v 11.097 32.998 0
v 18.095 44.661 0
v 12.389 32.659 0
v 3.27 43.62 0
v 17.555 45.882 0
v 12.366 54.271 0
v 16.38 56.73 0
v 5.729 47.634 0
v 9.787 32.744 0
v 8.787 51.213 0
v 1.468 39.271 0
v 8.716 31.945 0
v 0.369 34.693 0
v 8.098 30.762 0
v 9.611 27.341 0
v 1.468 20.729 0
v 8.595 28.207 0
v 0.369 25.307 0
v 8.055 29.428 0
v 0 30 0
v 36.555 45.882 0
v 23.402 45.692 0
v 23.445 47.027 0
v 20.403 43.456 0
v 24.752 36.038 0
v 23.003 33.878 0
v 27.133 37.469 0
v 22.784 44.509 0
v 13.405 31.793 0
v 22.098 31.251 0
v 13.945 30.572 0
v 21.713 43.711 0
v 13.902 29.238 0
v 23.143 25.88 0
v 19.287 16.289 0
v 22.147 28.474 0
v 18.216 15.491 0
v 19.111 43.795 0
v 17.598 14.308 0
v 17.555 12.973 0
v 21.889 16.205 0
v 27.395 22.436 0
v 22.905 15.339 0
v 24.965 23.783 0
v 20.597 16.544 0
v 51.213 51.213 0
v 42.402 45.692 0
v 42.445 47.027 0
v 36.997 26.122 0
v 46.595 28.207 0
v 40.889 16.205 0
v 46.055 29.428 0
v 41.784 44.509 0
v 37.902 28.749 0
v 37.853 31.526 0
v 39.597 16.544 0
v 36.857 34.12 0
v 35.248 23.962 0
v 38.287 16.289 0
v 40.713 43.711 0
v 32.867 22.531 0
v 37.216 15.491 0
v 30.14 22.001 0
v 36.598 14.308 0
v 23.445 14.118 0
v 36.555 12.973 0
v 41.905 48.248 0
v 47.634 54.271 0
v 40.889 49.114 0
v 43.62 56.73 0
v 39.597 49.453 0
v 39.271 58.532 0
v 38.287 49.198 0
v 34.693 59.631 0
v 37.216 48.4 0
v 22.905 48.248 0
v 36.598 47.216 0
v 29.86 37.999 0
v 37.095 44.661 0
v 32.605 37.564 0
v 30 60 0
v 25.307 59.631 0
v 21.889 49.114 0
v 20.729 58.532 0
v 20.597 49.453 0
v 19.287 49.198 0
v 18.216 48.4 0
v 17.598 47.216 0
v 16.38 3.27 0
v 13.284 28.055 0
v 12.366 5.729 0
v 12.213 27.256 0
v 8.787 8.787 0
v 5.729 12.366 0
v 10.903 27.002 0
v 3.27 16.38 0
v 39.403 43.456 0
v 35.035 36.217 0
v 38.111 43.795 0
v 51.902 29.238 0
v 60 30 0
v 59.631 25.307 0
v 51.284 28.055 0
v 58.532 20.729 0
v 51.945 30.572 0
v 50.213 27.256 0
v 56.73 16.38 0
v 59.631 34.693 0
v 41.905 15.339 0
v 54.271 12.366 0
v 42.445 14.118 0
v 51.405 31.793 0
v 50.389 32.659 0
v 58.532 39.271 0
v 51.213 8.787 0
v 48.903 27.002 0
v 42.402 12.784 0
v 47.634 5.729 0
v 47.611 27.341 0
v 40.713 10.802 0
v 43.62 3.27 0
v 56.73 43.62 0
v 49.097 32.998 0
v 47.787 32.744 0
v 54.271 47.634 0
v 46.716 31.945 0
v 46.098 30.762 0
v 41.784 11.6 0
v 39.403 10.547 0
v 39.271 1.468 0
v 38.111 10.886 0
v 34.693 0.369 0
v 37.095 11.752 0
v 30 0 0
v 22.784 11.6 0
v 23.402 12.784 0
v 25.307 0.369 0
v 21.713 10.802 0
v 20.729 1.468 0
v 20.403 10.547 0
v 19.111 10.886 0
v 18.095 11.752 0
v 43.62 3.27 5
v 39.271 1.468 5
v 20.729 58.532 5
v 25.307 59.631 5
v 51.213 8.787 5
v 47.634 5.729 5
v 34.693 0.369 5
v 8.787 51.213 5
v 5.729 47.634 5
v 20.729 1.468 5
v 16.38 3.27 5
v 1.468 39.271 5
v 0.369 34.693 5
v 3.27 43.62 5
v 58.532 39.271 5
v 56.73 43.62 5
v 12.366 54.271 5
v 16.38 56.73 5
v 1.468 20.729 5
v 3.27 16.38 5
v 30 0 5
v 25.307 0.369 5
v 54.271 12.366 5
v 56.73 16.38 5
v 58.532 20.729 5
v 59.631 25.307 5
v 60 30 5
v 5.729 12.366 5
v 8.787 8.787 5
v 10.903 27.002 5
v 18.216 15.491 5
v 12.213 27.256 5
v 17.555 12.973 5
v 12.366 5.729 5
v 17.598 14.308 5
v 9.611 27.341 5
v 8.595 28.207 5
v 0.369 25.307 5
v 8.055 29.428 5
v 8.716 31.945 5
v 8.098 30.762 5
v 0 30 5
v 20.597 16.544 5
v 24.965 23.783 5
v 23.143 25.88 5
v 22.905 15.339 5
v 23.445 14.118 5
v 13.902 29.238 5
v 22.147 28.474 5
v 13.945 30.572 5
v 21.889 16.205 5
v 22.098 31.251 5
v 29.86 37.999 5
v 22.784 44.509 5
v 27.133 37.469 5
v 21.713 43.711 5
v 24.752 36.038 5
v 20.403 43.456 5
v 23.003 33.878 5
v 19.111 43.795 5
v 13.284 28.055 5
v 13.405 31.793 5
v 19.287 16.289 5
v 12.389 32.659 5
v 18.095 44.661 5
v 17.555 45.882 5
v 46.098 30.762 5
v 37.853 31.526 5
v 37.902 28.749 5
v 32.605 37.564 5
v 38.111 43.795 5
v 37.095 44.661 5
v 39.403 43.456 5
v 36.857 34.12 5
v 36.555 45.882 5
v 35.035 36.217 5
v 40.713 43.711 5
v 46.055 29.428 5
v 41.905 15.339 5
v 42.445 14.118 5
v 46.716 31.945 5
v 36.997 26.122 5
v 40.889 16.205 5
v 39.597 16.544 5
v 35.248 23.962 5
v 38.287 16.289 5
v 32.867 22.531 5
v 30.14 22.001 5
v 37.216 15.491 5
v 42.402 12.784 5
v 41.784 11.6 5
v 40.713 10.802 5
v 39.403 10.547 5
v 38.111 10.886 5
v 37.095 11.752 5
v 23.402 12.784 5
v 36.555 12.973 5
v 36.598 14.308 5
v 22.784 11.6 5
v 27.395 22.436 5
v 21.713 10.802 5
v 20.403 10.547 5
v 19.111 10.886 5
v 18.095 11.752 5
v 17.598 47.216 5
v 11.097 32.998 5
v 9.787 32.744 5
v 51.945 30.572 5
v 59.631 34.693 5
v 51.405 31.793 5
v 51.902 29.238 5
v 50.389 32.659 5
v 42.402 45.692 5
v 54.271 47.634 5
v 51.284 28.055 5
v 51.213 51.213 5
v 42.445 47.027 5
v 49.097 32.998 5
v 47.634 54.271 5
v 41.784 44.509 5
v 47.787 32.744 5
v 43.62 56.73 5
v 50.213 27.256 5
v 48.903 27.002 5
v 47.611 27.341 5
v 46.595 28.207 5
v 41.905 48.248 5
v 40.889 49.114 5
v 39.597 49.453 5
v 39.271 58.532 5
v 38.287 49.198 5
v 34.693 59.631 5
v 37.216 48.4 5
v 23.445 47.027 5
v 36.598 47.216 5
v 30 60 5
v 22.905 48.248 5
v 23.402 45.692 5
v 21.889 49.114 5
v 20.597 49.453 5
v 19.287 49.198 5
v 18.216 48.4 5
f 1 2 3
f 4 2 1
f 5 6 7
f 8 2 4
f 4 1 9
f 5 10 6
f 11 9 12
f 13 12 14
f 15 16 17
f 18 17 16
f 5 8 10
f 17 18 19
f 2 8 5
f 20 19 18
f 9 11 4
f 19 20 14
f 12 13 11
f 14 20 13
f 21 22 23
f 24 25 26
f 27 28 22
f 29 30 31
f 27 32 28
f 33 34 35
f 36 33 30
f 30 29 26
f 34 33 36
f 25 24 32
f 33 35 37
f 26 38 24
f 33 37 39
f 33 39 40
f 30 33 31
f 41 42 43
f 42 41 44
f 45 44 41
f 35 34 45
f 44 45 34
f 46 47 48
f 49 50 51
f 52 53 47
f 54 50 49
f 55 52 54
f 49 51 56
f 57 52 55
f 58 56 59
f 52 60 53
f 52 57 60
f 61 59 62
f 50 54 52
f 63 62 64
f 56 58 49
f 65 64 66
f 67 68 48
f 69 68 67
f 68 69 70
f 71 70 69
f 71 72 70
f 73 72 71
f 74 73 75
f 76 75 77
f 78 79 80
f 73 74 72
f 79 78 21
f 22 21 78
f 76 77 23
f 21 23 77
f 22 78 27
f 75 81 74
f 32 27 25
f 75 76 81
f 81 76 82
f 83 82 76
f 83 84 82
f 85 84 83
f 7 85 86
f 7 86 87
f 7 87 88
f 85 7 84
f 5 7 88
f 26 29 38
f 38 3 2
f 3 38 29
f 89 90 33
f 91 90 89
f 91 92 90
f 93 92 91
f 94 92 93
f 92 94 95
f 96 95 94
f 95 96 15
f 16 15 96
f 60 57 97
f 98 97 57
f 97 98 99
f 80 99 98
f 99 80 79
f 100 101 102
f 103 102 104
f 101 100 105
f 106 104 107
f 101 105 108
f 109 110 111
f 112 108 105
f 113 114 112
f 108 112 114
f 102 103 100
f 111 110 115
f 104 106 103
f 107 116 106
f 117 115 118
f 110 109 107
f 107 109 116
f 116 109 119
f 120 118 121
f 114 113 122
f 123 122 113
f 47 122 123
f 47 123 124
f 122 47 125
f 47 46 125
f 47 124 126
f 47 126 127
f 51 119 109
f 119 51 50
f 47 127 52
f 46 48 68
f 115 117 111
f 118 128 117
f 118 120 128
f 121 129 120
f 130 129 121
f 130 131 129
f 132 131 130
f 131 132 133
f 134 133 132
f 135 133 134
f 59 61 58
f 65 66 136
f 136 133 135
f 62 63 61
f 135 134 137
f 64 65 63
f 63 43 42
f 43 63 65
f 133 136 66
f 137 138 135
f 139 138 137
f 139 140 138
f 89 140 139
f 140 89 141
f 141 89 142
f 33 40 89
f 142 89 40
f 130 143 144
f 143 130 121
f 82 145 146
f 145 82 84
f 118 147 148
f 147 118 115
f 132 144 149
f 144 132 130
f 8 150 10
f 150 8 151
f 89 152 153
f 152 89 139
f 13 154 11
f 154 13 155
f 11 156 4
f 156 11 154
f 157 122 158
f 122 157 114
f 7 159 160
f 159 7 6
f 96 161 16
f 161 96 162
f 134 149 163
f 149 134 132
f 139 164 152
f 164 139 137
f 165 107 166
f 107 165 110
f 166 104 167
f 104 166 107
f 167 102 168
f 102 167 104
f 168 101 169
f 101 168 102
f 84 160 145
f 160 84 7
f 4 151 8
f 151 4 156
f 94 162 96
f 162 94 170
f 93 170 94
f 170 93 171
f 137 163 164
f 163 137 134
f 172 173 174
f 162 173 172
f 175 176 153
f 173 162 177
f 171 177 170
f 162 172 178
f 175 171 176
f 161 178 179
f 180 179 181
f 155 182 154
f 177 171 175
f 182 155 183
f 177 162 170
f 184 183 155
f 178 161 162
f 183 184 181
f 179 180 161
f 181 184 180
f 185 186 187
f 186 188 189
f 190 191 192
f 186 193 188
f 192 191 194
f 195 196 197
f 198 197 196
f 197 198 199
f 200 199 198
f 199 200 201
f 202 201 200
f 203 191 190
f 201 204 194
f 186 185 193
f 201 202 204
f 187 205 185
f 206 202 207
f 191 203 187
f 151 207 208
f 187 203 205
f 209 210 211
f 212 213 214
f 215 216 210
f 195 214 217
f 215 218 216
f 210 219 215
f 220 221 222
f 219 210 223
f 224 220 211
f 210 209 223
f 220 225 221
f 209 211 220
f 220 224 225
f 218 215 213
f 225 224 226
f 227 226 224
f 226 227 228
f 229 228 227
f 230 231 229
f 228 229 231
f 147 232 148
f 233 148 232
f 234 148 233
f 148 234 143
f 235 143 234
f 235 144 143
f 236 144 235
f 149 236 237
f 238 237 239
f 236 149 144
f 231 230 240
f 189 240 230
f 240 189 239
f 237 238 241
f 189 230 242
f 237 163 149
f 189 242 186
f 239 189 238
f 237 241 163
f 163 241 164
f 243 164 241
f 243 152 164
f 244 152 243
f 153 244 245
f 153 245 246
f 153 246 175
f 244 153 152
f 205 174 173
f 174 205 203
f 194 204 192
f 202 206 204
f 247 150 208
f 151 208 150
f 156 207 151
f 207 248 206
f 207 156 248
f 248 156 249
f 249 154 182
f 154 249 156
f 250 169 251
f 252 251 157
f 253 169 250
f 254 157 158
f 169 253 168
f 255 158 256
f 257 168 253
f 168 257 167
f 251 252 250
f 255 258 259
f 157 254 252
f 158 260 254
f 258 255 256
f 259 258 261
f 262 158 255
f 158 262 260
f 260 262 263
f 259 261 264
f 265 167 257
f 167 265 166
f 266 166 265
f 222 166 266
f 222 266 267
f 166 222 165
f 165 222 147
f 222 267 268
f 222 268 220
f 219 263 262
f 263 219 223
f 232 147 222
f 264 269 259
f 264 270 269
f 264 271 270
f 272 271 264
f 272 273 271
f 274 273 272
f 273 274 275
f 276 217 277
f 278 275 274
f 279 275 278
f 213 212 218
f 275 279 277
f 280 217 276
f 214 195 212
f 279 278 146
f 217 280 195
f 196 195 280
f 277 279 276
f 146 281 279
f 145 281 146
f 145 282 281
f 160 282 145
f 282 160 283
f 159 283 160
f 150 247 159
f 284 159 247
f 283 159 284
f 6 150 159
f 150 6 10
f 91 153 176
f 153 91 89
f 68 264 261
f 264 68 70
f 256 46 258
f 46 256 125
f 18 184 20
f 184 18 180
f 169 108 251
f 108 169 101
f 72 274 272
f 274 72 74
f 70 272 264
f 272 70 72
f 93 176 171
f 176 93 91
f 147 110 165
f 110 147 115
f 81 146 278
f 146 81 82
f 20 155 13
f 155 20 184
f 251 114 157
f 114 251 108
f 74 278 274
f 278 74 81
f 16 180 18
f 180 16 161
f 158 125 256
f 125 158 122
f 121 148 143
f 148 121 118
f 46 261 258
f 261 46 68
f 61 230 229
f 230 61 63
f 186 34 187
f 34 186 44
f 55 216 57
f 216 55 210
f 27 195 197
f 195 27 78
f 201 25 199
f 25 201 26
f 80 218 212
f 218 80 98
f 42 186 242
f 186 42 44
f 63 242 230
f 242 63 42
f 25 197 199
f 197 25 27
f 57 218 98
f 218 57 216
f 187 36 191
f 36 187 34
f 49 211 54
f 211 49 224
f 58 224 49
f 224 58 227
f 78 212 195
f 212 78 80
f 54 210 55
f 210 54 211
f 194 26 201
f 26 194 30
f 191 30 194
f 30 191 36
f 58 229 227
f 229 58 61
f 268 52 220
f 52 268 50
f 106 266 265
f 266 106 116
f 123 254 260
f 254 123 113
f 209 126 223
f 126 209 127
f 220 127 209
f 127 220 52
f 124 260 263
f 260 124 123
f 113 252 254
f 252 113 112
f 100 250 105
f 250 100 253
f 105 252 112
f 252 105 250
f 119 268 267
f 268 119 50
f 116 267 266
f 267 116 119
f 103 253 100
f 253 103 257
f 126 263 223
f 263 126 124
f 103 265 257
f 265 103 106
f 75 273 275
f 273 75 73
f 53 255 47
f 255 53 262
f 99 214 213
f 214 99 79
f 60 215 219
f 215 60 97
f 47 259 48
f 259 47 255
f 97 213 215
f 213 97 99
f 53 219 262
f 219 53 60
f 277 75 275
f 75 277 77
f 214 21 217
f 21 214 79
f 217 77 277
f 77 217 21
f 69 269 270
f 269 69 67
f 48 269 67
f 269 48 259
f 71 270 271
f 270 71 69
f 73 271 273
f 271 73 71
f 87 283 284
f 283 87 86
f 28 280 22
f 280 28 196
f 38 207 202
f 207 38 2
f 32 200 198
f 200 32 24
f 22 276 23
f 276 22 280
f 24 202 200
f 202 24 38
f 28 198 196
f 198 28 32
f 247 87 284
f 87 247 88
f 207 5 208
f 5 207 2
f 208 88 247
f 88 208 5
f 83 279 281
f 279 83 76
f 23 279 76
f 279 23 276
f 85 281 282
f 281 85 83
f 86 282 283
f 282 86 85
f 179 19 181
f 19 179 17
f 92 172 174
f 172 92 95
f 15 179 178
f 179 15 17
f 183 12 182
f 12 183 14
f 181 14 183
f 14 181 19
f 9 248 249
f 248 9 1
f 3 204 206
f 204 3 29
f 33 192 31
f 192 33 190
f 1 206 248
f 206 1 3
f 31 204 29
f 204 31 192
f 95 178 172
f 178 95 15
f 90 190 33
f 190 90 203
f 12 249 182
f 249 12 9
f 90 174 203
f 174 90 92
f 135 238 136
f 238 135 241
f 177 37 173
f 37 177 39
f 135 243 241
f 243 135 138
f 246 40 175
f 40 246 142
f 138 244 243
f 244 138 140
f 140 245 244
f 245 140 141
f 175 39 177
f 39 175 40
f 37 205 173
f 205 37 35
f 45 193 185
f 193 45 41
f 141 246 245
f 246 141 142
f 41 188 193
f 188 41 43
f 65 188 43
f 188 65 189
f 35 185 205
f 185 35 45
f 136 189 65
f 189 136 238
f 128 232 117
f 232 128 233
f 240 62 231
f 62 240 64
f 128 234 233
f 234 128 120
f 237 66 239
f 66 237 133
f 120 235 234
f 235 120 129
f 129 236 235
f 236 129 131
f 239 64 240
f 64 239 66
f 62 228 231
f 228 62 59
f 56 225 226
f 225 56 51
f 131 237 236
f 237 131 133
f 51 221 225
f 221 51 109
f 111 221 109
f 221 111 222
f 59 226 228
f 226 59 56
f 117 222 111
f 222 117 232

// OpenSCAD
$fn = 32;

// ----------------------------------------------------------------------
// Spacer plate: round flange R30, 6 bolts
// ----------------------------------------------------------------------

// --- parameters (mm) ---
bore_r = 8;               // centre bore radius
bolt_r = 3;               // bolt hole radius
plate_t = 5;              // plate thickness, Z (extrusion height)
flange_r = 30;            // flange radius
n_bolt = 6;               // bolt hole count
ring_r = 19;              // bolt circle radius

profile = [[60, 30], [59.631, 34.693], [58.532, 39.271], [56.73, 43.62], [54.271, 47.634], [51.213, 51.213], [47.634, 54.271], [43.62, 56.73], [39.271, 58.532], [34.693, 59.631], [30, 60], [25.307, 59.631], [20.729, 58.532], [16.38, 56.73], [12.366, 54.271], [8.787, 51.213], [5.729, 47.634], [3.27, 43.62], [1.468, 39.271], [0.369, 34.693], [0, 30], [0.369, 25.307], [1.468, 20.729], [3.27, 16.38], [5.729, 12.366], [8.787, 8.787], [12.366, 5.729], [16.38, 3.27], [20.729, 1.468], [25.307, 0.369], [30, 0], [34.693, 0.369], [39.271, 1.468], [43.62, 3.27], [47.634, 5.729], [51.213, 8.787], [54.271, 12.366], [56.73, 16.38], [58.532, 20.729], [59.631, 25.307]];  // primary outline, 40 points, counter clockwise
void_1 = [[37.853, 31.526], [36.857, 34.12], [35.035, 36.217], [32.605, 37.564], [29.86, 37.999], [27.133, 37.469], [24.752, 36.038], [23.003, 33.878], [22.098, 31.251], [22.147, 28.474], [23.143, 25.88], [24.965, 23.783], [27.395, 22.436], [30.14, 22.001], [32.867, 22.531], [35.248, 23.962], [36.997, 26.122], [37.902, 28.749]];  // centre bore, 18 points
void_2 = [[51.945, 30.572], [51.405, 31.793], [50.389, 32.659], [49.097, 32.998], [47.787, 32.744], [46.716, 31.945], [46.098, 30.762], [46.055, 29.428], [46.595, 28.207], [47.611, 27.341], [48.903, 27.002], [50.213, 27.256], [51.284, 28.055], [51.902, 29.238]];  // bolt hole 1, 14 points
void_3 = [[42.445, 47.027], [41.905, 48.248], [40.889, 49.114], [39.597, 49.453], [38.287, 49.198], [37.216, 48.4], [36.598, 47.216], [36.555, 45.882], [37.095, 44.661], [38.111, 43.795], [39.403, 43.456], [40.713, 43.711], [41.784, 44.509], [42.402, 45.692]];  // bolt hole 2, 14 points
void_4 = [[23.445, 47.027], [22.905, 48.248], [21.889, 49.114], [20.597, 49.453], [19.287, 49.198], [18.216, 48.4], [17.598, 47.216], [17.555, 45.882], [18.095, 44.661], [19.111, 43.795], [20.403, 43.456], [21.713, 43.711], [22.784, 44.509], [23.402, 45.692]];  // bolt hole 3, 14 points
void_5 = [[13.945, 30.572], [13.405, 31.793], [12.389, 32.659], [11.097, 32.998], [9.787, 32.744], [8.716, 31.945], [8.098, 30.762], [8.055, 29.428], [8.595, 28.207], [9.611, 27.341], [10.903, 27.002], [12.213, 27.256], [13.284, 28.055], [13.902, 29.238]];  // bolt hole 4, 14 points
void_6 = [[23.445, 14.118], [22.905, 15.339], [21.889, 16.205], [20.597, 16.544], [19.287, 16.289], [18.216, 15.491], [17.598, 14.308], [17.555, 12.973], [18.095, 11.752], [19.111, 10.886], [20.403, 10.547], [21.713, 10.802], [22.784, 11.6], [23.402, 12.784]];  // bolt hole 5, 14 points
void_7 = [[42.445, 14.118], [41.905, 15.339], [40.889, 16.205], [39.597, 16.544], [38.287, 16.289], [37.216, 15.491], [36.598, 14.308], [36.555, 12.973], [37.095, 11.752], [38.111, 10.886], [39.403, 10.547], [40.713, 10.802], [41.784, 11.6], [42.402, 12.784]];  // bolt hole 6, 14 points

// --- the one profile operation ---
difference() {
  linear_extrude(height = plate_t) polygon(points = profile);
  translate([0, 0, -1])
    linear_extrude(height = plate_t + 2) polygon(points = void_1);
  translate([0, 0, -1])
    linear_extrude(height = plate_t + 2) polygon(points = void_2);
  translate([0, 0, -1])
    linear_extrude(height = plate_t + 2) polygon(points = void_3);
  translate([0, 0, -1])
    linear_extrude(height = plate_t + 2) polygon(points = void_4);
  translate([0, 0, -1])
    linear_extrude(height = plate_t + 2) polygon(points = void_5);
  translate([0, 0, -1])
    linear_extrude(height = plate_t + 2) polygon(points = void_6);
  translate([0, 0, -1])
    linear_extrude(height = plate_t + 2) polygon(points = void_7);
}
